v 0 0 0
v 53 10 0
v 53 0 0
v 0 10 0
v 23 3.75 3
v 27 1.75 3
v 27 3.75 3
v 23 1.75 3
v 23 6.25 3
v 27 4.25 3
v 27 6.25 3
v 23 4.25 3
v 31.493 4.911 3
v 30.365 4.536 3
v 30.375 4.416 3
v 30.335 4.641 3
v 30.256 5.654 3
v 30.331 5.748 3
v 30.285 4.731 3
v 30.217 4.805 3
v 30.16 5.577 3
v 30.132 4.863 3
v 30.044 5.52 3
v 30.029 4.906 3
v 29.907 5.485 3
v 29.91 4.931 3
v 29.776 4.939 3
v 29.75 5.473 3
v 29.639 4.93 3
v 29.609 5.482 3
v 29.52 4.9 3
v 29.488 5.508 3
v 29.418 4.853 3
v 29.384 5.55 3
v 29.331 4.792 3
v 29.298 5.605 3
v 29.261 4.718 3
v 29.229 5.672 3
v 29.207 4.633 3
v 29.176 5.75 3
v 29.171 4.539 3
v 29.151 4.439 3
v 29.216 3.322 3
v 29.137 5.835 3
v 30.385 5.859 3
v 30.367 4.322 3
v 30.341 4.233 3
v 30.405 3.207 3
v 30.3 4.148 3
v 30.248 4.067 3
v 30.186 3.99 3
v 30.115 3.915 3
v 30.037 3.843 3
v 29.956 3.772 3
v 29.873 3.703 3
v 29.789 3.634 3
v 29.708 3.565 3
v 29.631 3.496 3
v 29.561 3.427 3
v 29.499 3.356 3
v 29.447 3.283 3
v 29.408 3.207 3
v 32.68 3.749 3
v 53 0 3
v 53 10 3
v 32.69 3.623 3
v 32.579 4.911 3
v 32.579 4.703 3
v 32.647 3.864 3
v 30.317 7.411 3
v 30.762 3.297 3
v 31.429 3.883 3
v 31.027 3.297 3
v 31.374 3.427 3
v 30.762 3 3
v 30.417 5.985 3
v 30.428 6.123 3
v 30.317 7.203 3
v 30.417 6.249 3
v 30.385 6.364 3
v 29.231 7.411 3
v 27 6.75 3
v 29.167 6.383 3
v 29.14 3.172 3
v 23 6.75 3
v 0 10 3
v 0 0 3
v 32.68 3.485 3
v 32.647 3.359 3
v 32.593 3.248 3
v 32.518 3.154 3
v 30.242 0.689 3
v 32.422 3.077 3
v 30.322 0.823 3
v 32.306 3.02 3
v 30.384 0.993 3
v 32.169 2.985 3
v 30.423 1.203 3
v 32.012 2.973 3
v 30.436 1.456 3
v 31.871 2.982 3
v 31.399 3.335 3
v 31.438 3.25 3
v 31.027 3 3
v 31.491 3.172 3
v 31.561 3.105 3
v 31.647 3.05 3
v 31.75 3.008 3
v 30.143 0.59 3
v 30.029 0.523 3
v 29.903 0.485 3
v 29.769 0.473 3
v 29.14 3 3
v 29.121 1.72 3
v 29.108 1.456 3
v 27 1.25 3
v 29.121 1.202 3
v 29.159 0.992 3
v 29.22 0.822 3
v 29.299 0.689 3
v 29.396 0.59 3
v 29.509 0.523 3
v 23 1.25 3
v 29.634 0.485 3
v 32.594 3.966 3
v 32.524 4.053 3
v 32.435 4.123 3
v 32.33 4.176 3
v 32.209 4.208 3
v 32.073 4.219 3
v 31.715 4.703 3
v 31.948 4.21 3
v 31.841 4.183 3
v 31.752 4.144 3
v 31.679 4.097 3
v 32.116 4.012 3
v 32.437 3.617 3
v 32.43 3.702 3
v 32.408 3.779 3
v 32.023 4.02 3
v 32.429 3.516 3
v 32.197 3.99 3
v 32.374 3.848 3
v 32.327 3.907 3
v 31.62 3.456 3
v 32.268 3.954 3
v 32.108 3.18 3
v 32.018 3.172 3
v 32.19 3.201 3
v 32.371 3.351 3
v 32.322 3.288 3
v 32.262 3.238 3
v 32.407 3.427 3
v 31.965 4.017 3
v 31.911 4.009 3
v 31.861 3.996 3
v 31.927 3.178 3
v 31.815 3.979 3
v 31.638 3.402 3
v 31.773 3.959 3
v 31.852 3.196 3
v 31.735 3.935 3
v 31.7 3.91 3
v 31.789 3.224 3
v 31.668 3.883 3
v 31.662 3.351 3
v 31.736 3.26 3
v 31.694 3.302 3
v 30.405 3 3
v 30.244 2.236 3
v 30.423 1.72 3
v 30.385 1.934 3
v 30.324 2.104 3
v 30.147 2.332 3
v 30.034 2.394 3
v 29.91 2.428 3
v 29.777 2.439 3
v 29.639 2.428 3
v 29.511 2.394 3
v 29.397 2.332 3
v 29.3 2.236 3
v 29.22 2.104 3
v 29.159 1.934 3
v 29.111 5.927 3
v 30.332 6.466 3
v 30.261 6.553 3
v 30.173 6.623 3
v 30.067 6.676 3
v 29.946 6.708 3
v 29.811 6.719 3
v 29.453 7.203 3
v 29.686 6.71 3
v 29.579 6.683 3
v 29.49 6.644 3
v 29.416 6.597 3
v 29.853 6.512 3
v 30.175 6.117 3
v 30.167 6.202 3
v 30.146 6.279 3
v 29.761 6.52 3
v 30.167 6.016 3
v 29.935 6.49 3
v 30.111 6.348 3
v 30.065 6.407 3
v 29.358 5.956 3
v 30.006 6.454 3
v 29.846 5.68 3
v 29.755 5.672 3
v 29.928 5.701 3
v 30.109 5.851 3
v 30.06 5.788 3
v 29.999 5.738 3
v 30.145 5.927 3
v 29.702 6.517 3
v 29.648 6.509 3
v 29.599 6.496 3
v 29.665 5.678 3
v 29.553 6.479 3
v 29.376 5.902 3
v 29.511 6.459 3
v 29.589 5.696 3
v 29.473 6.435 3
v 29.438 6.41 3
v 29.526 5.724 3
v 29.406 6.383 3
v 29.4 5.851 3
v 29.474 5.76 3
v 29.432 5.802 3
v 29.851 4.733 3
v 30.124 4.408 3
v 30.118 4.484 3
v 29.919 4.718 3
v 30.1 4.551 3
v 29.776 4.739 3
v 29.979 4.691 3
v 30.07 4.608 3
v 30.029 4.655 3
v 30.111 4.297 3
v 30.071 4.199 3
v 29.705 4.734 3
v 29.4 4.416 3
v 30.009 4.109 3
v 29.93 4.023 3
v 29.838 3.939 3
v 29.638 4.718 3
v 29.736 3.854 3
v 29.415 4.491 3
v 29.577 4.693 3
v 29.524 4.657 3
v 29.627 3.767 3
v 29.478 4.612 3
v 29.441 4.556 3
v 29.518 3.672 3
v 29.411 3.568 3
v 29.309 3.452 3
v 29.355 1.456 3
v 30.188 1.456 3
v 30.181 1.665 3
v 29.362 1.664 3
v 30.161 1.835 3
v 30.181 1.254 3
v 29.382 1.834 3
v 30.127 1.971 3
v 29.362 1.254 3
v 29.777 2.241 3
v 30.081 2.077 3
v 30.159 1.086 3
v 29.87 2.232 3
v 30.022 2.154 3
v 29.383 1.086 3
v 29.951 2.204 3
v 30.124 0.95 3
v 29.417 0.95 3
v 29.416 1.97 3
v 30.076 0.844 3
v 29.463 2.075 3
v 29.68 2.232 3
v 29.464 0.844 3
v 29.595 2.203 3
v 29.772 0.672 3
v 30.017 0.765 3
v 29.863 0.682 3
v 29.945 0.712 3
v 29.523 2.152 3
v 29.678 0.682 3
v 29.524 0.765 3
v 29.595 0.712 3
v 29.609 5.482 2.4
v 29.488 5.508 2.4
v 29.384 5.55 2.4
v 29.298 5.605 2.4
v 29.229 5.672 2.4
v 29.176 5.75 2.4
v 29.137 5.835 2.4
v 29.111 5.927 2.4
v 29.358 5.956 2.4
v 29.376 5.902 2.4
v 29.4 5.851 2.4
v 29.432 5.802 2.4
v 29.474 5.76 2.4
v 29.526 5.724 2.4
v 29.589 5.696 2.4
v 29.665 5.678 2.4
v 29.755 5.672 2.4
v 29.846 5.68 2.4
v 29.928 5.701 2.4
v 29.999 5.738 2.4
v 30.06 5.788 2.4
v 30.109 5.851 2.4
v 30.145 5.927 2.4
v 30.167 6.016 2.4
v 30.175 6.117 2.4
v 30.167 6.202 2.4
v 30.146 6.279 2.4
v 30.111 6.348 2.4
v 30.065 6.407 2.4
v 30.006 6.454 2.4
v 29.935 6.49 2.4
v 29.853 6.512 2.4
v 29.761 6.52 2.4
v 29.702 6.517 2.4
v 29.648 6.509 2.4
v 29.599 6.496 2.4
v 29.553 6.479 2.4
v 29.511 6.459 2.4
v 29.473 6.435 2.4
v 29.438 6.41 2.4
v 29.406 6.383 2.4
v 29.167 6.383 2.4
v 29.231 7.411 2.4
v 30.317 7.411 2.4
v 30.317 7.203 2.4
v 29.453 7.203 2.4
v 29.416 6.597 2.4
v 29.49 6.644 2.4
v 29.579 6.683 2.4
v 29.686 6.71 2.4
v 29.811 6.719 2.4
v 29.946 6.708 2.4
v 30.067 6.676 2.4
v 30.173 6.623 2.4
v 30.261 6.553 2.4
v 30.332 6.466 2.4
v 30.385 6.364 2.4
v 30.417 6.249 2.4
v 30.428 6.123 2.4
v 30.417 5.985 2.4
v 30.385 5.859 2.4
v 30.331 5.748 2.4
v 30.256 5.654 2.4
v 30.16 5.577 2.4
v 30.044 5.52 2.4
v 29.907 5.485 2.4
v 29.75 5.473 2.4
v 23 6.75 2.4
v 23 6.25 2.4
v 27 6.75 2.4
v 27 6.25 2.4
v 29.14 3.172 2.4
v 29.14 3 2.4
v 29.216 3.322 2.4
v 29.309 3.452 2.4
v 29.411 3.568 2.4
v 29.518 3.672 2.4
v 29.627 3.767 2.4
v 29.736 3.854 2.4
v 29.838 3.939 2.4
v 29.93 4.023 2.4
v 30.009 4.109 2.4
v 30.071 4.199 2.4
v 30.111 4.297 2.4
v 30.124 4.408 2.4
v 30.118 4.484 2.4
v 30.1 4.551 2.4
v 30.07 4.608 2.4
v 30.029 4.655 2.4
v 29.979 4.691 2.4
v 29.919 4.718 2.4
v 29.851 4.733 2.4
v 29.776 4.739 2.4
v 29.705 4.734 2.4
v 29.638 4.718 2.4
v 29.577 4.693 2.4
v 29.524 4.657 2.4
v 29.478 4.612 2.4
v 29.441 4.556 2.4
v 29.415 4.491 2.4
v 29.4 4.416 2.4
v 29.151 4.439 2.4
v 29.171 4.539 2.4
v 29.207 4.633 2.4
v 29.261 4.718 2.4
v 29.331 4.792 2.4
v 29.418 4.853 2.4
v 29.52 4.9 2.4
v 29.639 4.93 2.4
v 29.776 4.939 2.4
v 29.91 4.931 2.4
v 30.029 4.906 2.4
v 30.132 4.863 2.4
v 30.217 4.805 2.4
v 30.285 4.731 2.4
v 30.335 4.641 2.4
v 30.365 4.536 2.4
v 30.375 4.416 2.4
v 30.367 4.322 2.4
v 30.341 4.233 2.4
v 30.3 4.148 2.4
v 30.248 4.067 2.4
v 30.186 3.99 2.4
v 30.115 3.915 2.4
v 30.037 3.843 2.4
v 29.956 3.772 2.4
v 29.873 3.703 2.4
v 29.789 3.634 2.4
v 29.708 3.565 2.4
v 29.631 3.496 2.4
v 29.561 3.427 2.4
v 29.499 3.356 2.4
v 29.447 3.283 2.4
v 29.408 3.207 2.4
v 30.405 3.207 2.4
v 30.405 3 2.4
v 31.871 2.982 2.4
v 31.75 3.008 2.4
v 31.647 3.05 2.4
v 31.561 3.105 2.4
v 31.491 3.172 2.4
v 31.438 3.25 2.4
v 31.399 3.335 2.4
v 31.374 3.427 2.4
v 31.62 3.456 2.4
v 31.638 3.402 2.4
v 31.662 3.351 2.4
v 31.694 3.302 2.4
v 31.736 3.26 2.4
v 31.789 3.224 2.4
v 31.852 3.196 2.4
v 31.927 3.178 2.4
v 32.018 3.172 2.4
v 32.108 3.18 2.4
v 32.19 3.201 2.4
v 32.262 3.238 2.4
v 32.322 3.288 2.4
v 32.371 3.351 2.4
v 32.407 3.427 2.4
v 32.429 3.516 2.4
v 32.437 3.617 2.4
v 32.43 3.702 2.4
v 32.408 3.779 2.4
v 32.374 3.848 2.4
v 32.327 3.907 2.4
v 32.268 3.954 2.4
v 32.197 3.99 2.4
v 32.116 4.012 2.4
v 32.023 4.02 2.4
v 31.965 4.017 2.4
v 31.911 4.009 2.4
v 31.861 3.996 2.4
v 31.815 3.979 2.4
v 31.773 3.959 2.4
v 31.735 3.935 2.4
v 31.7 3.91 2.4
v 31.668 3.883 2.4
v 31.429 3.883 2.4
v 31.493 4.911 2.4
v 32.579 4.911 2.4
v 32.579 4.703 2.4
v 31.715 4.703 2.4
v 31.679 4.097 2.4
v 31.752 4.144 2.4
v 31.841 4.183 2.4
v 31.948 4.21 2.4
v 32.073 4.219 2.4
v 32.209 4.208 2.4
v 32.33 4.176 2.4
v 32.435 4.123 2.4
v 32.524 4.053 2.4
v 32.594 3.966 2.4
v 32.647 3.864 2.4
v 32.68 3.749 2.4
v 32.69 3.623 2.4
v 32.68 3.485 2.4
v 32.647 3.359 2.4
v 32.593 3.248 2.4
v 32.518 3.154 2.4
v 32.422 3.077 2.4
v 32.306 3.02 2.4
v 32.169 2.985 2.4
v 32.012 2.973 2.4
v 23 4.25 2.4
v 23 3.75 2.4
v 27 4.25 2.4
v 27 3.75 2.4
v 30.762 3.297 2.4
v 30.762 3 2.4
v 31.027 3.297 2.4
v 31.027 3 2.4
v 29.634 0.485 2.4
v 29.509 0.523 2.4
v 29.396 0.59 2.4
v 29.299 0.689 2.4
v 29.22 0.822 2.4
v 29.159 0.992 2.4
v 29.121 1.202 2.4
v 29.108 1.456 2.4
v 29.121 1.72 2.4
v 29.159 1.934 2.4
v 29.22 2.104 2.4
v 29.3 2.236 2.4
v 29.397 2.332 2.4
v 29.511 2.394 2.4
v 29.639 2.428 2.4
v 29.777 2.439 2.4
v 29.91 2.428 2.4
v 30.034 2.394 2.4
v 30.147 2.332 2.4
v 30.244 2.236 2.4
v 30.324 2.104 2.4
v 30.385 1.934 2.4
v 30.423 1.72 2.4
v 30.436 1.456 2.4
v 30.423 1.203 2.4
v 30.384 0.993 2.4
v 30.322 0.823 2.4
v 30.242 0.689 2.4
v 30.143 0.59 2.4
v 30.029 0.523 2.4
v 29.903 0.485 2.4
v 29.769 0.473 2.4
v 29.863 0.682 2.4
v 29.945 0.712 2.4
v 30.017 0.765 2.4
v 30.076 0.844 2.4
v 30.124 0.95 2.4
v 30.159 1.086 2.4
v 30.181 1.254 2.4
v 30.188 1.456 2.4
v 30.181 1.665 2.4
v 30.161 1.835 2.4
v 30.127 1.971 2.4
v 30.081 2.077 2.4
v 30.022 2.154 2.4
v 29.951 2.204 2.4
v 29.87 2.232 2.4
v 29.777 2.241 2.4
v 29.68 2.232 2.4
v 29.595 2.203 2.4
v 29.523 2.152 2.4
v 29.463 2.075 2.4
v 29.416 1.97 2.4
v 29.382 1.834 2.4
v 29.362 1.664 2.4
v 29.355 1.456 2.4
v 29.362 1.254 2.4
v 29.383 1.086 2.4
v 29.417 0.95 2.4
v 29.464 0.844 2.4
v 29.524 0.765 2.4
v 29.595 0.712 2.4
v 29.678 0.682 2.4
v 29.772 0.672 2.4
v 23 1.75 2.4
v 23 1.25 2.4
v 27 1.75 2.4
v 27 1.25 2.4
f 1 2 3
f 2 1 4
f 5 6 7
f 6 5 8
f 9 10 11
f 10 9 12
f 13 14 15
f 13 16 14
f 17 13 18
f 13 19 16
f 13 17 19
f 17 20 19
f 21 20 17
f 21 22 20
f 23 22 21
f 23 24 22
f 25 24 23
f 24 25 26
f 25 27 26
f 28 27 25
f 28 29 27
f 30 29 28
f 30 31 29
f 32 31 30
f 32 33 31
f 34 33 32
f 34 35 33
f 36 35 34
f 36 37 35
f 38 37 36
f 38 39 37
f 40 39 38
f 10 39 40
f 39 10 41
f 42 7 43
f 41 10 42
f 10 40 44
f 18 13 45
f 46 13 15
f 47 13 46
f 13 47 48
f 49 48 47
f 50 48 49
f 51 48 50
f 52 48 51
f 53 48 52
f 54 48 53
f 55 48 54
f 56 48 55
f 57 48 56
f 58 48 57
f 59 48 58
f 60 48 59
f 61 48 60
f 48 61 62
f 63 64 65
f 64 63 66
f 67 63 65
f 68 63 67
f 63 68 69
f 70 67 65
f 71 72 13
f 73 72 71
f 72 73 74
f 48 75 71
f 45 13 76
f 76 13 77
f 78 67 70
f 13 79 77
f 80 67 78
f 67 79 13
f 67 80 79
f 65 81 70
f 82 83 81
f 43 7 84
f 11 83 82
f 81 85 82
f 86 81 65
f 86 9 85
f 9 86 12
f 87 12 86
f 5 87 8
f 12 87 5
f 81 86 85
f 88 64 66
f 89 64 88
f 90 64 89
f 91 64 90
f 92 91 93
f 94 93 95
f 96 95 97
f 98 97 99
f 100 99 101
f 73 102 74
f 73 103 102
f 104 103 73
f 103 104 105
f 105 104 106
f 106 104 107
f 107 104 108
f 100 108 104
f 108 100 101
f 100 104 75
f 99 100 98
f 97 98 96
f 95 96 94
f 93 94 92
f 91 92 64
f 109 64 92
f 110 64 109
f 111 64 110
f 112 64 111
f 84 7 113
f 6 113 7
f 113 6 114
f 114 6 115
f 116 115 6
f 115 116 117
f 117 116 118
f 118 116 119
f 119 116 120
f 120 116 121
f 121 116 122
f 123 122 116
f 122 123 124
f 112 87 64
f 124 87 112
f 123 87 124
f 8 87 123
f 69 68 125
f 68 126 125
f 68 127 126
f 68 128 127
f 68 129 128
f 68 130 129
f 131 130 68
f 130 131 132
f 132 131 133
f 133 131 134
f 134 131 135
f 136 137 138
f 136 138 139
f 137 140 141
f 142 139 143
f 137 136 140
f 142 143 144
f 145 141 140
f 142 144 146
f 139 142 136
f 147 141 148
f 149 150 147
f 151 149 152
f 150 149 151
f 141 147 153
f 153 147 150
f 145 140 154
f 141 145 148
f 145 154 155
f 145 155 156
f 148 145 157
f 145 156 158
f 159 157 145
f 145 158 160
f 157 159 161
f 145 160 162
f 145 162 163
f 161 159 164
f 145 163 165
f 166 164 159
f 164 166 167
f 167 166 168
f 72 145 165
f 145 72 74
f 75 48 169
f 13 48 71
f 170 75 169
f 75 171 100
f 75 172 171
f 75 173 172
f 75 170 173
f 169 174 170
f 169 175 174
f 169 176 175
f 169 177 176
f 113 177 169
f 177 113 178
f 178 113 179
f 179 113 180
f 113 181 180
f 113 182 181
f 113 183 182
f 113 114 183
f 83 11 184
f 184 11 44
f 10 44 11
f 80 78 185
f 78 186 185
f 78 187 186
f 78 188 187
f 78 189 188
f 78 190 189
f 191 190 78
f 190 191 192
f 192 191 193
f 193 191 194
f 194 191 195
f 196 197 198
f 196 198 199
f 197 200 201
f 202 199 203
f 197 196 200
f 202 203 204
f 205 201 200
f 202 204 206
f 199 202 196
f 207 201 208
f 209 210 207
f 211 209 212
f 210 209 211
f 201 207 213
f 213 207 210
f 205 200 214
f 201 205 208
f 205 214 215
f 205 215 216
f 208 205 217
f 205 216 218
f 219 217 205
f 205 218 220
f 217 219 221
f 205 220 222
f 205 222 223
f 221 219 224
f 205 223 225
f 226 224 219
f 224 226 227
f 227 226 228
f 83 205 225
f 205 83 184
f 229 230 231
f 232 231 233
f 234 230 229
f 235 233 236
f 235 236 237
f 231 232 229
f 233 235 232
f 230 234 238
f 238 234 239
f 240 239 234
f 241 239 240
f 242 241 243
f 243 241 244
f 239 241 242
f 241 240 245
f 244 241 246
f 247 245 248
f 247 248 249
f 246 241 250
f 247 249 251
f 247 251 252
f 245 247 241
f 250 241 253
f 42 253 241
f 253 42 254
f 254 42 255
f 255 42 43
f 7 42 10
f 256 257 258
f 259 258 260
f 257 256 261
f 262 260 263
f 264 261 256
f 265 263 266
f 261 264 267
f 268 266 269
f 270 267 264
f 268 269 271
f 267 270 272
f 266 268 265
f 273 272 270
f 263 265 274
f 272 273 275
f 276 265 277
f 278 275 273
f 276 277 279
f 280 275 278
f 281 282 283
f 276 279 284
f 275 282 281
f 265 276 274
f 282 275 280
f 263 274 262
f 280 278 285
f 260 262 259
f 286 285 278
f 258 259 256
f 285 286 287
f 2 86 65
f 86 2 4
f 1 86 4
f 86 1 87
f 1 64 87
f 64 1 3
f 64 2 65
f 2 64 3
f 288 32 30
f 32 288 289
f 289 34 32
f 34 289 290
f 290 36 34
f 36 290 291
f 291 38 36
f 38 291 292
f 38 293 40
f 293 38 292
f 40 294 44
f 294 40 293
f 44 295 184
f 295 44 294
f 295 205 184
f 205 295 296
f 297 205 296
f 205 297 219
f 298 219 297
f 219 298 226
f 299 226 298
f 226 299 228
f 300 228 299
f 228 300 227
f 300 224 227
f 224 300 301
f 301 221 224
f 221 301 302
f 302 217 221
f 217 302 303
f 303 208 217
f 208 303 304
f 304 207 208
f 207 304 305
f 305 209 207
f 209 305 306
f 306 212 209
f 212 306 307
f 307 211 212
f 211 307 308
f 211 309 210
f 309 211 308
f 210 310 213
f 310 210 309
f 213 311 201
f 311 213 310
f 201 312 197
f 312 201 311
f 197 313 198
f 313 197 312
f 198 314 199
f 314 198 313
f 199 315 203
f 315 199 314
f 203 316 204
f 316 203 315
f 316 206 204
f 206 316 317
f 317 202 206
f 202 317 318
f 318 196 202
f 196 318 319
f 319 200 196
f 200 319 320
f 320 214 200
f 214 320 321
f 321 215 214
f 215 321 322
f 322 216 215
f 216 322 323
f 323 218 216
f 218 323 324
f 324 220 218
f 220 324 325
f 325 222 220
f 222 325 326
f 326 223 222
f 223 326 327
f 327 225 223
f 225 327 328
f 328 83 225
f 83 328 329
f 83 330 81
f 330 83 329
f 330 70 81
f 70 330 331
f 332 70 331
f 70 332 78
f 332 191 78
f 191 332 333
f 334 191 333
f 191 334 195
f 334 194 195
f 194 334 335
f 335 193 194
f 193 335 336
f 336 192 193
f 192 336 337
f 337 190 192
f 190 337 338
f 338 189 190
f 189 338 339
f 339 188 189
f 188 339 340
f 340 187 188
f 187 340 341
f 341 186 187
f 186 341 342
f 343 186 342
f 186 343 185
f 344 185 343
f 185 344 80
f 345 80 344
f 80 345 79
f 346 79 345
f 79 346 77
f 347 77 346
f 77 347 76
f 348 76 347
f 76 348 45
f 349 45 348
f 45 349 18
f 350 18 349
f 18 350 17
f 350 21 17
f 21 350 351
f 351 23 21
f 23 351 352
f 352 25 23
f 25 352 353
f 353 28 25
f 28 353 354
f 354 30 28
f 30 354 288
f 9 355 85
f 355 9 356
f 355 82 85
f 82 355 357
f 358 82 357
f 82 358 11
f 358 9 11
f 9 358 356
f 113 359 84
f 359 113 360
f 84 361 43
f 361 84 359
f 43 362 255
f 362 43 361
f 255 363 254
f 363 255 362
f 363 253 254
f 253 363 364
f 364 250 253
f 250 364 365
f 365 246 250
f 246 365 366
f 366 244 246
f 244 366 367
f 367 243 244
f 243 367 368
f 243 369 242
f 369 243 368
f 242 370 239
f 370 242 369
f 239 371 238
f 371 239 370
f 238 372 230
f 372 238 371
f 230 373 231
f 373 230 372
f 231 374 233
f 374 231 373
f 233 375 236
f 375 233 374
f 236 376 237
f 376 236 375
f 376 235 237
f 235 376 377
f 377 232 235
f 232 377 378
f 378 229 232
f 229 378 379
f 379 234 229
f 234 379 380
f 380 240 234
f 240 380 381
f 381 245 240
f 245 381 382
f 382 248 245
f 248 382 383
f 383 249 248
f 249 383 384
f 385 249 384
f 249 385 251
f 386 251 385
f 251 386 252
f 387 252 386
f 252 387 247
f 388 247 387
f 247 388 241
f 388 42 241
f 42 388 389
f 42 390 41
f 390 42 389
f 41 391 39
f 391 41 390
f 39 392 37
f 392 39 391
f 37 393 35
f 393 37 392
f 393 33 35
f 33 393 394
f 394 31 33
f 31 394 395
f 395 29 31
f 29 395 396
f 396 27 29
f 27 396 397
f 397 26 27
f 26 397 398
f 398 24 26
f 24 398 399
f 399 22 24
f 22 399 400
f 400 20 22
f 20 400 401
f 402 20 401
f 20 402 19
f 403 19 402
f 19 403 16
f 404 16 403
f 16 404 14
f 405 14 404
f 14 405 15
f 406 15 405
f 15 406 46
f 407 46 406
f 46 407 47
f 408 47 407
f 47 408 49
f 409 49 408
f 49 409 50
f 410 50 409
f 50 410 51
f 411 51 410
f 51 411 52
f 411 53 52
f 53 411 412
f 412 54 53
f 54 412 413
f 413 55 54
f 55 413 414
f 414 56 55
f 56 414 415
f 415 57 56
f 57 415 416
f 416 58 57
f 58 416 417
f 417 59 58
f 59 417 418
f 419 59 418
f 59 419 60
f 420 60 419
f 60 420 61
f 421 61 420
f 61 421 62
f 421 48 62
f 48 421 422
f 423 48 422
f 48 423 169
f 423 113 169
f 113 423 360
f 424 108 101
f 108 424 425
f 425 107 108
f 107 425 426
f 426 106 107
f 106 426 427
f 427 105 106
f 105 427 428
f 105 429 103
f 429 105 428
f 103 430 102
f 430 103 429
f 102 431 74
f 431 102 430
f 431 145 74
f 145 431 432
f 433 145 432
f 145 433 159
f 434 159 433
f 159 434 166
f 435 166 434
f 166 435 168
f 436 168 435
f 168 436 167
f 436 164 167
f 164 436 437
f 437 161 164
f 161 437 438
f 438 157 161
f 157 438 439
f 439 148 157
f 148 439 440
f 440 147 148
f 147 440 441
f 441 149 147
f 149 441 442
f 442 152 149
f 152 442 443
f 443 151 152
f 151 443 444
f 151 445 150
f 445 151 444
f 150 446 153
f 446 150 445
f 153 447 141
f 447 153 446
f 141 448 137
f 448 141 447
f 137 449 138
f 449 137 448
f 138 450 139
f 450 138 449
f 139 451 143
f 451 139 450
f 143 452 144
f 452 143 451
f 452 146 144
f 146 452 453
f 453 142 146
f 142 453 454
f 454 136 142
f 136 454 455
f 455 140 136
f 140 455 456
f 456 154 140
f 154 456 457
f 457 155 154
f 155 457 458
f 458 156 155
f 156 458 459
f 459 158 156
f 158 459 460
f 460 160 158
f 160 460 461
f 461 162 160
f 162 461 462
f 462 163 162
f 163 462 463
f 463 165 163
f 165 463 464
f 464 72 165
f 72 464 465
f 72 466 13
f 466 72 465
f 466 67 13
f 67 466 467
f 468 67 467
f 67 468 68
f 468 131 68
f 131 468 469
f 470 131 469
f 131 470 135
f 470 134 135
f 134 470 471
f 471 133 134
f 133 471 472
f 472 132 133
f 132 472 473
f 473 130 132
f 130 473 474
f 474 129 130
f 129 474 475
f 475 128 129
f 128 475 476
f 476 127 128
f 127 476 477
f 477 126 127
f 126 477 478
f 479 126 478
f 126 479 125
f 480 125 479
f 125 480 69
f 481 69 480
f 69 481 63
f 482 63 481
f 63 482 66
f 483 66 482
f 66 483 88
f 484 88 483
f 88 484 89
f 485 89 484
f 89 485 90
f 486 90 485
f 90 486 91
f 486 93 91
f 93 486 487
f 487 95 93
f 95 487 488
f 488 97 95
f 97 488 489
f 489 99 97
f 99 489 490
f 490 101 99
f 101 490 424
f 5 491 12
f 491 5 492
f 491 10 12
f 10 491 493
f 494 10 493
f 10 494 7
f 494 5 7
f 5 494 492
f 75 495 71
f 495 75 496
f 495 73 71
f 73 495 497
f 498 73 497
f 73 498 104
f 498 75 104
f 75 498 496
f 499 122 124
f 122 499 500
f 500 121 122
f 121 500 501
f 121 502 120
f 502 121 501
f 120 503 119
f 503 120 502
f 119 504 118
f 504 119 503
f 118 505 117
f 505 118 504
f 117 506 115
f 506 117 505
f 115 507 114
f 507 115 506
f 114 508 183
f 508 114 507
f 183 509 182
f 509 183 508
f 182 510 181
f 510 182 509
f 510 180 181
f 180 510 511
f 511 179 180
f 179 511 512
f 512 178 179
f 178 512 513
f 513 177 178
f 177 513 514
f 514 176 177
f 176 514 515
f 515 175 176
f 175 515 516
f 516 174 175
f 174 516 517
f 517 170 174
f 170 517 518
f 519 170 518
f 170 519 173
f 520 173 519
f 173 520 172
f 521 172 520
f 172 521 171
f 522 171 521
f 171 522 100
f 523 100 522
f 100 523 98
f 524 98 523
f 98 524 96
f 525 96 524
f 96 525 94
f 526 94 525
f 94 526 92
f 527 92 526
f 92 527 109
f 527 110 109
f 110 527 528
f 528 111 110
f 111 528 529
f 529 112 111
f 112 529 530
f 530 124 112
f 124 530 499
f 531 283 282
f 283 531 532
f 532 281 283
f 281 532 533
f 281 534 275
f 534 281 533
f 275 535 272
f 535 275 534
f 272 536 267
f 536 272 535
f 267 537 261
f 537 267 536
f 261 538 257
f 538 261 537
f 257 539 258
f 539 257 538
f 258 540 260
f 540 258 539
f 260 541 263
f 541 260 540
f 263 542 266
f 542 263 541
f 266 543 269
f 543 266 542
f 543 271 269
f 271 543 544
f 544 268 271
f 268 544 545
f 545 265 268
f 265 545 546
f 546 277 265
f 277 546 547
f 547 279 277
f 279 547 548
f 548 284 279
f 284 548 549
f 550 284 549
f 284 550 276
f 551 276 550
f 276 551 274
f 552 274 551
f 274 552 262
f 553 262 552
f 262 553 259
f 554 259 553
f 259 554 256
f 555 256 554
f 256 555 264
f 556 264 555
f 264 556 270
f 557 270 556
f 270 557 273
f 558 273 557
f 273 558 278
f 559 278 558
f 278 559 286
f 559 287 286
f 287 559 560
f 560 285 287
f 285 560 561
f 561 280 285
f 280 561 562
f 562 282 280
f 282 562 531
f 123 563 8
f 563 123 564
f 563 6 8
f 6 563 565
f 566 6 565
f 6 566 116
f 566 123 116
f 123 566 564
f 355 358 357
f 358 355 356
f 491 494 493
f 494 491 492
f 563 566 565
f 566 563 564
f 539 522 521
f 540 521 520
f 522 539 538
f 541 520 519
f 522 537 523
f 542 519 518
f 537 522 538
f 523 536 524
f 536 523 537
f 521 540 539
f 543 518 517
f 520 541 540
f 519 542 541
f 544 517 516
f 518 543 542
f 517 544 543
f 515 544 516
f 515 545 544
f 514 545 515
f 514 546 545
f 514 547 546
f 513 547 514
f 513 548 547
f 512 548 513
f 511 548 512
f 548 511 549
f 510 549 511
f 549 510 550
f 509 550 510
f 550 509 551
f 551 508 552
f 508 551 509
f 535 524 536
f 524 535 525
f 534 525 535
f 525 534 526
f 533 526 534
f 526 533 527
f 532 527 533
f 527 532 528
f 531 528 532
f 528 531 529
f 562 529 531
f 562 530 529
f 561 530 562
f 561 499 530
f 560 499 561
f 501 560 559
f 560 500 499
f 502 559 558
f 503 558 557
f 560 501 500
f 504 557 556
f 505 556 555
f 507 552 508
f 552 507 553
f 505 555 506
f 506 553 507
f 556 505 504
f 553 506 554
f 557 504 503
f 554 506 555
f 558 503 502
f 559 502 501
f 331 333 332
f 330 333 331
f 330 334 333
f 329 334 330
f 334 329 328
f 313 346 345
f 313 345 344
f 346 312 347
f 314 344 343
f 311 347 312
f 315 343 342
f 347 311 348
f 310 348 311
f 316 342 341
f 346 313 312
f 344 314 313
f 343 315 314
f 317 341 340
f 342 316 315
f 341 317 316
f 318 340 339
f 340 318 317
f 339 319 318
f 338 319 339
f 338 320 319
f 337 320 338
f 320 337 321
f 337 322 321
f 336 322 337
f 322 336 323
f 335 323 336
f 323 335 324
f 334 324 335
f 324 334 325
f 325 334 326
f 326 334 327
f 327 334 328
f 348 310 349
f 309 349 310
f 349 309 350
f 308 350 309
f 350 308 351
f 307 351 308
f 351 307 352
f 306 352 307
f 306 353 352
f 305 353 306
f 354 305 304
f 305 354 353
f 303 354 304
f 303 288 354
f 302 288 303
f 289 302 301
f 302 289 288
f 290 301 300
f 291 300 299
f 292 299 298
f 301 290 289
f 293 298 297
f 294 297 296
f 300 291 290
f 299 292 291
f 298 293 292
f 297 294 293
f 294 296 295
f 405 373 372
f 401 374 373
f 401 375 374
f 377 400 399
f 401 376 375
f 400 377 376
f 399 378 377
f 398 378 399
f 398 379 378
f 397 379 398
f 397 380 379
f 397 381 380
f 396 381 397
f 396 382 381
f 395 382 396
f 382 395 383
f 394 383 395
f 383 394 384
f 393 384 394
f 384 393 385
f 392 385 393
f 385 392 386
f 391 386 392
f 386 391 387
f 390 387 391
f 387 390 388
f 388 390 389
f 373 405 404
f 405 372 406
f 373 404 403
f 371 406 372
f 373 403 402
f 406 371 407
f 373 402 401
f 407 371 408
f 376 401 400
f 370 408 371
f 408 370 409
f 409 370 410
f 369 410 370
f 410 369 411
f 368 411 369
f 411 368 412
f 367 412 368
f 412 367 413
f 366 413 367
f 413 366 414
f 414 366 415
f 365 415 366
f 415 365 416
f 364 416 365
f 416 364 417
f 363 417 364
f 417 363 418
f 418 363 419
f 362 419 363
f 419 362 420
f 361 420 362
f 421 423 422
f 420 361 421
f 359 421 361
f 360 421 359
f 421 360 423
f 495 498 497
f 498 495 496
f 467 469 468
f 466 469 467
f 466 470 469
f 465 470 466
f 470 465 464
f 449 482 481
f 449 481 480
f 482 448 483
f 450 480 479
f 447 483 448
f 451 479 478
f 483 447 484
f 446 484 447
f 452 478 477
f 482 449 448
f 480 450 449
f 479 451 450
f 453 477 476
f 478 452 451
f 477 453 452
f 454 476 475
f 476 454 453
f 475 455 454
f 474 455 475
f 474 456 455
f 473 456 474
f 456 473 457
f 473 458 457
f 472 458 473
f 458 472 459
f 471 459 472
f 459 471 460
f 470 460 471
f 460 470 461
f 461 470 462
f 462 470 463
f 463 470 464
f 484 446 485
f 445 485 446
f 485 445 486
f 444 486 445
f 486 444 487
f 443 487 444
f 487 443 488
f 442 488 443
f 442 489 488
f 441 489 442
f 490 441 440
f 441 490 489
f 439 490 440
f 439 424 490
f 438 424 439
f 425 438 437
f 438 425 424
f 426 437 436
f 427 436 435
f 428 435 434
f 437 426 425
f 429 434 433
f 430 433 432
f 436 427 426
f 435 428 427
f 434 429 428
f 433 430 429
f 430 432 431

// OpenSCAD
//(c) Inne Lemstra

render_3D = true; //if false render 2D for lasercutting.

h_box = 10;
thickness_plexi = 3;
groove_plexi = 1.5;
len_base = 50;

w_plexi = len_base + 2 * groove_plexi;
h_thick = 0.5;
w_thick = 4;

nr_size = 2;

if(render_3D){
    linear_extrude(thickness_plexi)
    make_front_plate();
    cube([w_plexi, h_box, thickness_plexi * 0.8]);
}else{
    make_front_plate();
}

module make_front_plate(){
difference(){
color("aqua"){
square([w_plexi, h_box]);
}

for(idx =[0:2.5:h_box - 2.6]){
    
    color("blue"){
        translate([len_base/2, idx + groove_plexi, 0]){
            square([w_thick, h_thick], center = true);
            translate([w_thick/2 + 2, - nr_size/2,0]){
            text(str(idx), nr_size);
            }
        }
    }
}
}
}
